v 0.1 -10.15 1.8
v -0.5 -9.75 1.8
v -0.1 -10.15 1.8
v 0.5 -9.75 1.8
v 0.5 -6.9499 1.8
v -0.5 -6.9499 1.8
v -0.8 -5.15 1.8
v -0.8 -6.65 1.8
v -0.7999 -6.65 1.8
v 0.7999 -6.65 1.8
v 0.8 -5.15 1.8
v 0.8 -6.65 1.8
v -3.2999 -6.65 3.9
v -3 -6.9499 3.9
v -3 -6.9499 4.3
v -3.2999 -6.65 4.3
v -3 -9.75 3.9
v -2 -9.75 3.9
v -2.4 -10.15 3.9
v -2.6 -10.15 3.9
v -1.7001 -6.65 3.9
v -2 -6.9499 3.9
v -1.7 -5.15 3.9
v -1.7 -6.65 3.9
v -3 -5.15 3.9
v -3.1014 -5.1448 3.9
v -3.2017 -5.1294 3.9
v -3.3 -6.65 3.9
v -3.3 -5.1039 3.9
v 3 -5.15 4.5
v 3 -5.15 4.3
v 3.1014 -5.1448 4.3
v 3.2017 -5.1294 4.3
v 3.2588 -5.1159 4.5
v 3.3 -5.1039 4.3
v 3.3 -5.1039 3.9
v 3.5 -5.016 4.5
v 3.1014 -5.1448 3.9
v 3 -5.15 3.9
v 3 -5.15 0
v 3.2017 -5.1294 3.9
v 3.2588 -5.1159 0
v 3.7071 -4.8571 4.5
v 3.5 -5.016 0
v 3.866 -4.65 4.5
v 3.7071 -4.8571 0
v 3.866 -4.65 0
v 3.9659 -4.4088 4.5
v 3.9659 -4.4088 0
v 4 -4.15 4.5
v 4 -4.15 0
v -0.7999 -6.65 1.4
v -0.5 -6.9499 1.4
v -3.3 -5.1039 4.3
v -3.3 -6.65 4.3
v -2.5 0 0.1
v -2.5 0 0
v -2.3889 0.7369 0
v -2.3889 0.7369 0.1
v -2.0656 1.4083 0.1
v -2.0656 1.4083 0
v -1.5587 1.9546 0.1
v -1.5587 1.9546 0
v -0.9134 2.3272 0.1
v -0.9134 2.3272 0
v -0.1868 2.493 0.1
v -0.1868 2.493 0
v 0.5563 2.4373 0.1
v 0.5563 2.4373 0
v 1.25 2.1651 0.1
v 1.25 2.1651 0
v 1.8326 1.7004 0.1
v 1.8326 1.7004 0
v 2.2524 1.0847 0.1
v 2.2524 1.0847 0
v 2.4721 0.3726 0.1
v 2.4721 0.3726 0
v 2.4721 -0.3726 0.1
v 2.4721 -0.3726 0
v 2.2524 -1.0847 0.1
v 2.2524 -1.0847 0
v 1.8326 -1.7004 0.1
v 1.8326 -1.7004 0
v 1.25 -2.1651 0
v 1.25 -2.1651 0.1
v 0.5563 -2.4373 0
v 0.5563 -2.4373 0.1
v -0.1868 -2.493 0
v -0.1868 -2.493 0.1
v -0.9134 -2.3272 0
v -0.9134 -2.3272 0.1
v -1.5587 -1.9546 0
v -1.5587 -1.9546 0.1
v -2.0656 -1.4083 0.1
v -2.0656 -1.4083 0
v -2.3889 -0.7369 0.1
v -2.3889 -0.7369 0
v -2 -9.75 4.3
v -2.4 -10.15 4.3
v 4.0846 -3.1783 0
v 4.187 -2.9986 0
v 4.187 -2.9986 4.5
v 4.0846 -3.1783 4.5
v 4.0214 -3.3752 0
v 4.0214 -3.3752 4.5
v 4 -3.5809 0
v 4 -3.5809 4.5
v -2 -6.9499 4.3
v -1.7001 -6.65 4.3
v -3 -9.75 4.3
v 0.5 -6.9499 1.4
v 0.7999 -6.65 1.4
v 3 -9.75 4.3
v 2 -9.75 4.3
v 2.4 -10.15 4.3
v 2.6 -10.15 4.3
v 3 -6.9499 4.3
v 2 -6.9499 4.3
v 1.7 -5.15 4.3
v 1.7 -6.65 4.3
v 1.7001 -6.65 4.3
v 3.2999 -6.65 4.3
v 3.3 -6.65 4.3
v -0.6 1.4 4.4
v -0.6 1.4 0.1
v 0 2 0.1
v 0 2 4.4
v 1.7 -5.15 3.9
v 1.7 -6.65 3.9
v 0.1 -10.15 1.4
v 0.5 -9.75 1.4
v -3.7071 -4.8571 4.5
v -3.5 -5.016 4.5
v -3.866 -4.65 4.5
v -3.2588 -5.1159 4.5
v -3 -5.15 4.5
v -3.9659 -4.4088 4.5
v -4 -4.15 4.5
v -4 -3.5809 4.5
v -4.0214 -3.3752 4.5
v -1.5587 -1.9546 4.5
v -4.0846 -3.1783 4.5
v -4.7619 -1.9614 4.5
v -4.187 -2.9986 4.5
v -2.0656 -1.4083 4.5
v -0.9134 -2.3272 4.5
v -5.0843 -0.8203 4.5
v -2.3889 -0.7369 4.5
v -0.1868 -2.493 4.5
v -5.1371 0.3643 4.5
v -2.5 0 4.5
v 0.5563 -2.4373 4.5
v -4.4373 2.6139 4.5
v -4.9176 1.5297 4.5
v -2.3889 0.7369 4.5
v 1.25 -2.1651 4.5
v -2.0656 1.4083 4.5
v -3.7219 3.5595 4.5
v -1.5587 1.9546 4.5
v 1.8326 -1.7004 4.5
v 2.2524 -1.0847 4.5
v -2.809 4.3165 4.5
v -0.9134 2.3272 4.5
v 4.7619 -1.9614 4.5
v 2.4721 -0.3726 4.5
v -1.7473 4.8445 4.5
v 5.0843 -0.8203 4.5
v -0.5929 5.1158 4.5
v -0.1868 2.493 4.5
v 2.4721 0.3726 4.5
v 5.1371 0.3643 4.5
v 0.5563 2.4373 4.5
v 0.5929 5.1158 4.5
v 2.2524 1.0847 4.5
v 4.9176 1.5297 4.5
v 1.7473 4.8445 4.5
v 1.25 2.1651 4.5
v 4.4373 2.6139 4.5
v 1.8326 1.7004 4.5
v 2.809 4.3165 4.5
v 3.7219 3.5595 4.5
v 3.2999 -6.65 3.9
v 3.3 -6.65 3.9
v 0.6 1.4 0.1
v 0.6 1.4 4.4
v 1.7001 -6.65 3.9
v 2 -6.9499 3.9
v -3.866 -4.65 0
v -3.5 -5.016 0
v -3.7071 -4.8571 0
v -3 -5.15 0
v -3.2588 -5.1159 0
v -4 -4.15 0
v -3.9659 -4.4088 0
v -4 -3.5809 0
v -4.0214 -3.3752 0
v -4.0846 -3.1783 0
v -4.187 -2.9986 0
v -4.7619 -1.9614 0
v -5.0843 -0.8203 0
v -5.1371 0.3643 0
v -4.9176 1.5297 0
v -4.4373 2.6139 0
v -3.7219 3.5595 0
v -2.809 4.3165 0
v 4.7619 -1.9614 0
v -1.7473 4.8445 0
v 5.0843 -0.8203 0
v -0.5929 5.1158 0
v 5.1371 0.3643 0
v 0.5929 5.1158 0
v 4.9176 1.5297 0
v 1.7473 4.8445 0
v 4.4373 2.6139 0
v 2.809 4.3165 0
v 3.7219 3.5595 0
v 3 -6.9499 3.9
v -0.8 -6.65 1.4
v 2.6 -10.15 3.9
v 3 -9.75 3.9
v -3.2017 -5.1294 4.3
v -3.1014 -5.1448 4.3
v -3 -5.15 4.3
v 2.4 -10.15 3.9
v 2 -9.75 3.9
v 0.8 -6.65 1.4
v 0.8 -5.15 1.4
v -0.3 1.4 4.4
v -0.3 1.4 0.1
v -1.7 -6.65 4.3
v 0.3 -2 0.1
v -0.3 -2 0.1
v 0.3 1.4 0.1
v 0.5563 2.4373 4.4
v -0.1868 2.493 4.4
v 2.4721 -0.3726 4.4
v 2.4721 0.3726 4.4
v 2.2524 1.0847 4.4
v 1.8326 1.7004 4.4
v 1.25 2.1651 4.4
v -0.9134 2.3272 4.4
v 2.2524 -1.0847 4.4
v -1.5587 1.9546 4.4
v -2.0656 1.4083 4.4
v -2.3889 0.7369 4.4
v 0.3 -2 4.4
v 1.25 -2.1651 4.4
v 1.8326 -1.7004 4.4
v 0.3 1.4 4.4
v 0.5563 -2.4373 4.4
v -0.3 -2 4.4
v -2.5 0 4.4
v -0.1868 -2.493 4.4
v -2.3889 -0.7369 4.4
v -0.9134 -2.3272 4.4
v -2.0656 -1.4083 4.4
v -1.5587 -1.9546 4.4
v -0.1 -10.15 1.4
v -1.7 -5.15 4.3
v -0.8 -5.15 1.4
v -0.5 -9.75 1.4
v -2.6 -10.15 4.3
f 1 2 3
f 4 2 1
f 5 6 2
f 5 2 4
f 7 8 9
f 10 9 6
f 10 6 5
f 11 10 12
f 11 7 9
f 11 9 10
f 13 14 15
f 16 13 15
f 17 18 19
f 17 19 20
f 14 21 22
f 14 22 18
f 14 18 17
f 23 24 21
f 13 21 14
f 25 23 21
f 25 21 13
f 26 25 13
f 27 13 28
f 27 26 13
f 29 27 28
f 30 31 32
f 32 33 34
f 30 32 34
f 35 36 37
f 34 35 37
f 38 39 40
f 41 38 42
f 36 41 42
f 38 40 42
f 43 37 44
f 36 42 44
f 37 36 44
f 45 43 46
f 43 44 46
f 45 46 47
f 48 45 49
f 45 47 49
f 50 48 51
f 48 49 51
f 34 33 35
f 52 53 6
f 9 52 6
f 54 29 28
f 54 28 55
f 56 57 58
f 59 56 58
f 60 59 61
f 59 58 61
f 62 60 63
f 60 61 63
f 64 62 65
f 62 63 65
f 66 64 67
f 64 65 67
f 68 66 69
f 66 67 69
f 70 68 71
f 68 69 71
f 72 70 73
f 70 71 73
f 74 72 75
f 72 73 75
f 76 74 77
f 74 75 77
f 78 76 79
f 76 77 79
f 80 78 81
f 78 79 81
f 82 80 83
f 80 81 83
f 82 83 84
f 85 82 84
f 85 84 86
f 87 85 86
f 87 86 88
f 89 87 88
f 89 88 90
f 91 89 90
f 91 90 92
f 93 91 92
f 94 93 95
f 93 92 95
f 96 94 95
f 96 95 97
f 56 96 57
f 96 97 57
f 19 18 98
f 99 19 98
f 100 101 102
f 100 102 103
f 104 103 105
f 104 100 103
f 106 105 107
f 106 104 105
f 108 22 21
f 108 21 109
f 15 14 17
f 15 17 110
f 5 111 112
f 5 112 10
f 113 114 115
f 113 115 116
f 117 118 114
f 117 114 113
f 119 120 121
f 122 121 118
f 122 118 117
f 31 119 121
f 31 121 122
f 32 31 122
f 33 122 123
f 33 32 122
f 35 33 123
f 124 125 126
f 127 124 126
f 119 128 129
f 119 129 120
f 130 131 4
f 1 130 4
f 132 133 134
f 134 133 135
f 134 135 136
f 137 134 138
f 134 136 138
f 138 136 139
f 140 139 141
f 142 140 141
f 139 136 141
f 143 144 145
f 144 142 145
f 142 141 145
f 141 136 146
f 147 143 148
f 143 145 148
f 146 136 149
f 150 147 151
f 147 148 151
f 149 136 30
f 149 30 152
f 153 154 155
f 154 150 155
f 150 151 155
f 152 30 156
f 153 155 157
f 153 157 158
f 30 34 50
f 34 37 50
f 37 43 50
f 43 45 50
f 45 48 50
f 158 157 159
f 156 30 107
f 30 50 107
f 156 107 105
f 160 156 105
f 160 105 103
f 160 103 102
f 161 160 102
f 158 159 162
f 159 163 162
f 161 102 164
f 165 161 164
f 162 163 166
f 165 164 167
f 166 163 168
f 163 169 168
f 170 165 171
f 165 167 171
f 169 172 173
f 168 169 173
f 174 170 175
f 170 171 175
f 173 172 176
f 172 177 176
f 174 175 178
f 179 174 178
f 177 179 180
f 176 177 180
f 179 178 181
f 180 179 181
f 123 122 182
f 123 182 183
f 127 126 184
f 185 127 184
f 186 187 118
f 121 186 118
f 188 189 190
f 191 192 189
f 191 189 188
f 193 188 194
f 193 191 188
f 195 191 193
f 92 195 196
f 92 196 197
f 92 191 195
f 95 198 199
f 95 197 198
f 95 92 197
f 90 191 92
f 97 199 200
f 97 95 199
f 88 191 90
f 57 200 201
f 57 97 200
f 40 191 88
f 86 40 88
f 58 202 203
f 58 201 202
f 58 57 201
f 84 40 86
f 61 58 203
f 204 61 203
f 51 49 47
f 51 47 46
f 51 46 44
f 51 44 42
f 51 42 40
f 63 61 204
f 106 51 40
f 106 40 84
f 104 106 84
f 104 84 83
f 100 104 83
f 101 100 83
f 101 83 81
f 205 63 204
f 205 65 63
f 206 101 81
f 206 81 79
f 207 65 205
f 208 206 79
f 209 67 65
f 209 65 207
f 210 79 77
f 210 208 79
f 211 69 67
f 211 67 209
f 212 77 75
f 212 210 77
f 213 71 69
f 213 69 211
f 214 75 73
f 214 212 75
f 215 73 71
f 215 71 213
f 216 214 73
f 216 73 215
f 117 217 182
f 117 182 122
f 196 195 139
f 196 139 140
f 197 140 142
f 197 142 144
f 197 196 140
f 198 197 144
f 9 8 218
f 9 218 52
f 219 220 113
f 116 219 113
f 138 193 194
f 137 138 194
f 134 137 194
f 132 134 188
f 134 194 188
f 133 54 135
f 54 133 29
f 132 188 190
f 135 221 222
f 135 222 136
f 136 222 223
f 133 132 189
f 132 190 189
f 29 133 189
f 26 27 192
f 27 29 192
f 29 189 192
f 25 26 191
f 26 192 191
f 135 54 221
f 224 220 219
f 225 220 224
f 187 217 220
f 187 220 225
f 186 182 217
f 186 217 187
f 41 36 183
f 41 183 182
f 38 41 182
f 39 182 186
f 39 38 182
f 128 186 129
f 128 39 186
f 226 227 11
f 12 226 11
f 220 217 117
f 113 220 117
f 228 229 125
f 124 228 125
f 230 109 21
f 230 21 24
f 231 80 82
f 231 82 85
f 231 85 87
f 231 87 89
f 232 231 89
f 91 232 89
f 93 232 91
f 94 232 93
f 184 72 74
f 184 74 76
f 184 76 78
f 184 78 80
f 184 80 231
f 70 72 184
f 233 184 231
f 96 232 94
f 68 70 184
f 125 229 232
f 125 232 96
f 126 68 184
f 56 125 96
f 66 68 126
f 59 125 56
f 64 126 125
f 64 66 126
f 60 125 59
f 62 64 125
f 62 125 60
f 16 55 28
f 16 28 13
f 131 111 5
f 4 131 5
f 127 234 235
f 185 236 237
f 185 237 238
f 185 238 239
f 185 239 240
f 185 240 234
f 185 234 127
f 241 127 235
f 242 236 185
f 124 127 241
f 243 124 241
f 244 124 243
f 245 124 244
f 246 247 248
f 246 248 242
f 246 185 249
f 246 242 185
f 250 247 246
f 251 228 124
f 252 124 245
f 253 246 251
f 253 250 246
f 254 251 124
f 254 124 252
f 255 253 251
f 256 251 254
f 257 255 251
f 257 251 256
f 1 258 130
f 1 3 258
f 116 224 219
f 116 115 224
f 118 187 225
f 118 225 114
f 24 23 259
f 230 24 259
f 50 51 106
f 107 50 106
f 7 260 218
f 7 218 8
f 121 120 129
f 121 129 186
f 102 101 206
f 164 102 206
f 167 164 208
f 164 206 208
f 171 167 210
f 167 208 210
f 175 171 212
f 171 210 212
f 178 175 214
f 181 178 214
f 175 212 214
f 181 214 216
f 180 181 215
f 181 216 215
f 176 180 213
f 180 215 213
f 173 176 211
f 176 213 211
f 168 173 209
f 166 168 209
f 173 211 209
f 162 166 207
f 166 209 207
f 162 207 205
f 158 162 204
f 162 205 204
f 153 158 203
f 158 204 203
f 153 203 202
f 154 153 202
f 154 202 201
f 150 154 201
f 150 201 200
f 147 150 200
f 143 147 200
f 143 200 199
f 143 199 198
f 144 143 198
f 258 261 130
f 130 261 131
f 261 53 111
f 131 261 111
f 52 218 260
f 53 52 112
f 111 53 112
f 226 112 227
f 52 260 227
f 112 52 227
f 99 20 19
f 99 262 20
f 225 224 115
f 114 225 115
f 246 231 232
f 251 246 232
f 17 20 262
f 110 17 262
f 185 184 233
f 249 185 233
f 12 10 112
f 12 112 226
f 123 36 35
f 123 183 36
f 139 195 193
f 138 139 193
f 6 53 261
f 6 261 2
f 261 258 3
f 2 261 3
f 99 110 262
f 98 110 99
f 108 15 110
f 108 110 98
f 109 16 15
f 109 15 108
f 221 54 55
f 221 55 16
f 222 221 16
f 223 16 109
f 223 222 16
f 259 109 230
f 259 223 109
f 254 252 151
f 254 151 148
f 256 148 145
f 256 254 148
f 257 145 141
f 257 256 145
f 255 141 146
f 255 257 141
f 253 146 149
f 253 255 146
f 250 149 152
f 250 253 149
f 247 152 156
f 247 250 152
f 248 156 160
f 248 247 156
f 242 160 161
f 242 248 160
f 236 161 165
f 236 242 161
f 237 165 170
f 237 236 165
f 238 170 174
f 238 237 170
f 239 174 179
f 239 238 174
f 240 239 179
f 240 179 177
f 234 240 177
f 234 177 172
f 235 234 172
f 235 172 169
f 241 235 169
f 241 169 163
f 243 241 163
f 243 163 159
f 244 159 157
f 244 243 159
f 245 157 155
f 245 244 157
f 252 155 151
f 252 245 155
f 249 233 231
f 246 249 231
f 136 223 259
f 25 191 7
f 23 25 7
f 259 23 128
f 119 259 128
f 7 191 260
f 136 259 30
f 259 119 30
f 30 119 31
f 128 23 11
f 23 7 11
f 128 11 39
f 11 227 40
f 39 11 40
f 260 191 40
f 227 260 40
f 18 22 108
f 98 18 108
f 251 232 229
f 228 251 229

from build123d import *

# Parameters (mm, degrees)
BOSS_EXTRU_1_DEPTH      = 4.5
ESQUISSE2_W             = 1.6
ESQUISSE2_H             = 0.4
BOSS_EXTRU_2_DEPTH      = 1.5
ESQUISSE3_W             = 1
ESQUISSE3_H             = 0.4
BOSS_EXTRU_3_DEPTH      = 3.5
CHANFREIN1_SIZE         = 0.3
CHANFREIN2_SIZE         = 0.4
ESQUISSE4_R             = 2.5
ENL_V_MAT_EXTRU_1_DEPTH = 0.1
ENL_V_START             = -0.1
ESQUISSE5_R             = 2.5
ENL_V_MAT_EXTRU_2_DEPTH = 0.1
ENL_V_MAT_EXTRU_3_DEPTH = 13.202663644
CONG_1_R                = 1


# Some blends are built 0.0001 mm under size
with BuildPart() as part:
    # Esquisse1 → Boss.-Extru.1 (new body)
    with BuildSketch(Plane.XY):
        with BuildLine():
            Line((-4, -3.243840317), (-4, -5.15))
            Line((-4, -5.15), (4, -5.15))
            Line((4, -5.15), (4, -3.243840317))
            ThreePointArc((4, -3.243840317), (0, 5.15), (-4, -3.243840317))
        make_face()
    extrude(amount=BOSS_EXTRU_1_DEPTH)

    # Esquisse2 → Boss.-Extru.2 (add)
    with BuildSketch(Plane.XZ.offset(5.15)):
        with Locations((-2.5, 4.1)):
            Rectangle(ESQUISSE2_W, ESQUISSE2_H)
        with Locations((2.5, 4.1)):
            Rectangle(ESQUISSE2_W, ESQUISSE2_H)
        with Locations((0, 1.6)):
            Rectangle(ESQUISSE2_W, ESQUISSE2_H)
    extrude(amount=BOSS_EXTRU_2_DEPTH)

    # Esquisse3 → Boss.-Extru.3 (add)
    with BuildSketch(Plane.XZ.offset(6.65)):
        with Locations((-2.5, 4.1)):
            Rectangle(ESQUISSE3_W, ESQUISSE3_H)
        with Locations((2.5, 4.1)):
            Rectangle(ESQUISSE3_W, ESQUISSE3_H)
        with Locations((0, 1.6)):
            Rectangle(ESQUISSE3_W, ESQUISSE3_H)
    extrude(amount=BOSS_EXTRU_3_DEPTH)

    # Chanfrein1
    chanfrein1_edges = [part.edges().sort_by_distance(p)[0] for p in [
        (3, -6.65, 4.1),
        (-2, -6.65, 4.1),
        (0.5, -6.65, 1.6),
        (-0.5, -6.65, 1.6),
        (2, -6.65, 4.1),
        (-3, -6.65, 4.1),
    ]]
    chamfer(chanfrein1_edges, length=CHANFREIN1_SIZE - 0.0001)  # a hair under: the kernel refuses the full size

    # Chanfrein2
    chanfrein2_edges = [part.edges().sort_by_distance(p)[0] for p in [
        (-3, -10.15, 4.1),
        (-2, -10.15, 4.1),
        (2, -10.15, 4.1),
        (3, -10.15, 4.1),
        (-0.5, -10.15, 1.6),
        (0.5, -10.15, 1.6),
    ]]
    chamfer(chanfrein2_edges, length=CHANFREIN2_SIZE)

    # Esquisse4 → Enlèv. mat.-Extru.1 (cut)
    with BuildSketch(Plane(origin=(0, 0, 0), x_dir=(-1, 0, 0), z_dir=(0, 0, -1))):
        Circle(ESQUISSE4_R)
    extrude(amount=-ENL_V_MAT_EXTRU_1_DEPTH, mode=Mode.SUBTRACT)

    # Esquisse5 → Enlèv. mat.-Extru.2 (cut)
    with BuildSketch(Plane.XY.offset(4.5).offset(ENL_V_START)):
        with Locations(Location((0, 0, 0), (0, 0, 180))):
            Circle(ESQUISSE5_R)
    extrude(amount=ENL_V_MAT_EXTRU_2_DEPTH, mode=Mode.SUBTRACT)

    # Esquisse6 → Enlèv. mat.-Extru.3 (cut, through all)
    with BuildSketch(Plane(origin=(0, 0, 0.1), x_dir=(-1, 0, 0), z_dir=(0, 0, -1))):
        Polygon((0, 2), (-0.6, 1.4), (-0.3, 1.4), (-0.3, -2), (0.3, -2), (0.3, 1.4), (0.6, 1.4), align=None)
    extrude(amount=-ENL_V_MAT_EXTRU_3_DEPTH, mode=Mode.SUBTRACT)

    # Congé1
    # the kernel refuses this fillet: 1 mm, written as the material it adds along each edge
    with BuildSketch(Plane(origin=(-4, -3.243840317, 0), x_dir=(0, -1, 0), z_dir=(0, 0, 1))) as cong_1_piece_1:
        with BuildLine():
            CenterArc((0.337011537, -1), CONG_1_R, 90, 35.609116242)
            ThreePointArc((-0.245240797, -0.18699187), (-0.12122038, -0.095332066), (0, 0))
            Line((0, 0), (0.337011537, 0))
        make_face()
    extrude(amount=4.5)
    with BuildSketch(Plane(origin=(4, -3.243840317, 0), x_dir=(0, -1, 0), z_dir=(0, 0, 1))) as cong_1_piece_2:
        with BuildLine():
            CenterArc((0.337011537, 1), CONG_1_R, 234.390883758, 35.609116242)
            ThreePointArc((-0.245240797, 0.18699187), (-0.12122038, 0.095332066), (0, 0))
            Line((0, 0), (0.337011537, 0))
        make_face()
    extrude(amount=4.5)
    # the kernel refuses this fillet: 1 mm, written as the material it takes off along each edge
    with BuildSketch(Plane(origin=(-4, -5.15, -2.5), x_dir=(1, 0, 0), z_dir=(0, 0, 1))) as cong_1_2_piece_1_section:
        with BuildLine():
            CenterArc((CONG_1_R, CONG_1_R), CONG_1_R, 180, 90)
            Line((0, CONG_1_R), (0, 0))
            Line((0, 0), (CONG_1_R, 0))
        make_face()
    cong_1_2_piece_1 = extrude(amount=9.5, mode=Mode.PRIVATE)
    cong_1_2_piece_1 = split(cong_1_2_piece_1, bisect_by=Plane(origin=(-3.3, -5.149735602, 0.7), z_dir=(1, 0, 0)), keep=Keep.TOP, mode=Mode.PRIVATE)
    cong_1_2_piece_1 = split(cong_1_2_piece_1, bisect_by=Plane(origin=(-3.182548732, -5.149735602, 3.9), z_dir=(0, 0, -1)), keep=Keep.TOP, mode=Mode.PRIVATE)
    add(cong_1_2_piece_1, mode=Mode.SUBTRACT)
    with BuildSketch(Plane(origin=(-4, -5.15, -2.5), x_dir=(1, 0, 0), z_dir=(0, 0, 1))) as cong_1_2_piece_2_section:
        with BuildLine():
            CenterArc((CONG_1_R, CONG_1_R), CONG_1_R, 180, 90)
            Line((0, CONG_1_R), (0, 0))
            Line((0, 0), (CONG_1_R, 0))
        make_face()
    cong_1_2_piece_2 = extrude(amount=9.5, mode=Mode.PRIVATE)
    cong_1_2_piece_2 = split(cong_1_2_piece_2, bisect_by=Plane(origin=(-3.3, -4.913833239, 0.7), z_dir=(-1, 0, 0)), keep=Keep.TOP, mode=Mode.PRIVATE)
    cong_1_2_piece_2 = split(cong_1_2_piece_2, bisect_by=Plane(origin=(-3.799145829, -4.913833239, 3.9), z_dir=(0, 0, -1)), keep=Keep.TOP, mode=Mode.PRIVATE)
    add(cong_1_2_piece_2, mode=Mode.SUBTRACT)
    with BuildSketch(Plane(origin=(-4, -5.15, -2.5), x_dir=(1, 0, 0), z_dir=(0, 0, 1))) as cong_1_2_piece_3_section:
        with BuildLine():
            CenterArc((CONG_1_R, CONG_1_R), CONG_1_R, 180, 90)
            Line((0, CONG_1_R), (0, 0))
            Line((0, 0), (CONG_1_R, 0))
        make_face()
    cong_1_2_piece_3 = extrude(amount=9.5, mode=Mode.PRIVATE)
    cong_1_2_piece_3 = split(cong_1_2_piece_3, bisect_by=Plane(origin=(-3.799145829, -4.913833239, 4.3), z_dir=(0, 0, -1)), keep=Keep.TOP, mode=Mode.PRIVATE)
    cong_1_2_piece_3 = split(cong_1_2_piece_3, bisect_by=Plane(origin=(-3.3, -4.913833239, 4.1), z_dir=(-1, 0, 0)), keep=Keep.TOP, mode=Mode.PRIVATE)
    cong_1_2_piece_3 = split(cong_1_2_piece_3, bisect_by=Plane(origin=(-3.799145829, -4.913833239, 3.9), z_dir=(0, 0, 1)), keep=Keep.TOP, mode=Mode.PRIVATE)
    add(cong_1_2_piece_3, mode=Mode.SUBTRACT)
    with BuildSketch(Plane(origin=(-4, -5.15, -2.5), x_dir=(1, 0, 0), z_dir=(0, 0, 1))) as cong_1_2_piece_4_section:
        with BuildLine():
            CenterArc((CONG_1_R, CONG_1_R), CONG_1_R, 180, 90)
            Line((0, CONG_1_R), (0, 0))
            Line((0, 0), (CONG_1_R, 0))
        make_face()
    cong_1_2_piece_4 = extrude(amount=9.5, mode=Mode.PRIVATE)
    cong_1_2_piece_4 = split(cong_1_2_piece_4, bisect_by=Plane(origin=(-3.182548732, -5.149735602, 4.3), z_dir=(0, 0, 1)), keep=Keep.TOP, mode=Mode.PRIVATE)
    cong_1_2_piece_4 = split(cong_1_2_piece_4, bisect_by=Plane(origin=(-3.3, -5.149735602, 5.65), z_dir=(1, 0, 0)), keep=Keep.TOP, mode=Mode.PRIVATE)
    add(cong_1_2_piece_4, mode=Mode.SUBTRACT)
    with BuildSketch(Plane(origin=(-4, -5.15, -2.5), x_dir=(1, 0, 0), z_dir=(0, 0, 1))) as cong_1_2_piece_5_section:
        with BuildLine():
            CenterArc((CONG_1_R, CONG_1_R), CONG_1_R, 180, 90)
            Line((0, CONG_1_R), (0, 0))
            Line((0, 0), (CONG_1_R, 0))
        make_face()
    cong_1_2_piece_5 = extrude(amount=9.5, mode=Mode.PRIVATE)
    cong_1_2_piece_5 = split(cong_1_2_piece_5, bisect_by=Plane(origin=(-3.799145829, -4.913833239, 4.3), z_dir=(0, 0, 1)), keep=Keep.TOP, mode=Mode.PRIVATE)
    cong_1_2_piece_5 = split(cong_1_2_piece_5, bisect_by=Plane(origin=(-3.3, -4.913833239, 5.65), z_dir=(-1, 0, 0)), keep=Keep.TOP, mode=Mode.PRIVATE)
    add(cong_1_2_piece_5, mode=Mode.SUBTRACT)
    with BuildSketch(Plane(origin=(4, -5.15, -2.5), x_dir=(-1, 0, 0), z_dir=(0, 0, 1))) as cong_1_2_piece_6_section:
        with BuildLine():
            CenterArc((CONG_1_R, -CONG_1_R), CONG_1_R, 90, 90)
            Line((0, -CONG_1_R), (0, 0))
            Line((0, 0), (CONG_1_R, 0))
        make_face()
    cong_1_2_piece_6 = extrude(amount=9.5, mode=Mode.PRIVATE)
    cong_1_2_piece_6 = split(cong_1_2_piece_6, bisect_by=Plane(origin=(3.3, -5.149735602, 0.7), z_dir=(-1, 0, 0)), keep=Keep.TOP, mode=Mode.PRIVATE)
    cong_1_2_piece_6 = split(cong_1_2_piece_6, bisect_by=Plane(origin=(3.182548732, -5.149735602, 3.9), z_dir=(0, 0, -1)), keep=Keep.TOP, mode=Mode.PRIVATE)
    add(cong_1_2_piece_6, mode=Mode.SUBTRACT)
    with BuildSketch(Plane(origin=(4, -5.15, -2.5), x_dir=(-1, 0, 0), z_dir=(0, 0, 1))) as cong_1_2_piece_7_section:
        with BuildLine():
            CenterArc((CONG_1_R, -CONG_1_R), CONG_1_R, 90, 90)
            Line((0, -CONG_1_R), (0, 0))
            Line((0, 0), (CONG_1_R, 0))
        make_face()
    cong_1_2_piece_7 = extrude(amount=9.5, mode=Mode.PRIVATE)
    cong_1_2_piece_7 = split(cong_1_2_piece_7, bisect_by=Plane(origin=(3.3, -4.913833239, 0.7), z_dir=(1, 0, 0)), keep=Keep.TOP, mode=Mode.PRIVATE)
    cong_1_2_piece_7 = split(cong_1_2_piece_7, bisect_by=Plane(origin=(3.799145829, -4.913833239, 3.9), z_dir=(0, 0, -1)), keep=Keep.TOP, mode=Mode.PRIVATE)
    add(cong_1_2_piece_7, mode=Mode.SUBTRACT)
    with BuildSketch(Plane(origin=(4, -5.15, -2.5), x_dir=(-1, 0, 0), z_dir=(0, 0, 1))) as cong_1_2_piece_8_section:
        with BuildLine():
            CenterArc((CONG_1_R, -CONG_1_R), CONG_1_R, 90, 90)
            Line((0, -CONG_1_R), (0, 0))
            Line((0, 0), (CONG_1_R, 0))
        make_face()
    cong_1_2_piece_8 = extrude(amount=9.5, mode=Mode.PRIVATE)
    cong_1_2_piece_8 = split(cong_1_2_piece_8, bisect_by=Plane(origin=(3.799145829, -4.913833239, 4.3), z_dir=(0, 0, -1)), keep=Keep.TOP, mode=Mode.PRIVATE)
    cong_1_2_piece_8 = split(cong_1_2_piece_8, bisect_by=Plane(origin=(3.3, -4.913833239, 4.1), z_dir=(1, 0, 0)), keep=Keep.TOP, mode=Mode.PRIVATE)
    cong_1_2_piece_8 = split(cong_1_2_piece_8, bisect_by=Plane(origin=(3.799145829, -4.913833239, 3.9), z_dir=(0, 0, 1)), keep=Keep.TOP, mode=Mode.PRIVATE)
    add(cong_1_2_piece_8, mode=Mode.SUBTRACT)
    with BuildSketch(Plane(origin=(4, -5.15, -2.5), x_dir=(-1, 0, 0), z_dir=(0, 0, 1))) as cong_1_2_piece_9_section:
        with BuildLine():
            CenterArc((CONG_1_R, -CONG_1_R), CONG_1_R, 90, 90)
            Line((0, -CONG_1_R), (0, 0))
            Line((0, 0), (CONG_1_R, 0))
        make_face()
    cong_1_2_piece_9 = extrude(amount=9.5, mode=Mode.PRIVATE)
    cong_1_2_piece_9 = split(cong_1_2_piece_9, bisect_by=Plane(origin=(3.182548732, -5.149735602, 4.3), z_dir=(0, 0, 1)), keep=Keep.TOP, mode=Mode.PRIVATE)
    cong_1_2_piece_9 = split(cong_1_2_piece_9, bisect_by=Plane(origin=(3.3, -5.149735602, 5.65), z_dir=(-1, 0, 0)), keep=Keep.TOP, mode=Mode.PRIVATE)
    add(cong_1_2_piece_9, mode=Mode.SUBTRACT)
    with BuildSketch(Plane(origin=(4, -5.15, -2.5), x_dir=(-1, 0, 0), z_dir=(0, 0, 1))) as cong_1_2_piece_10_section:
        with BuildLine():
            CenterArc((CONG_1_R, -CONG_1_R), CONG_1_R, 90, 90)
            Line((0, -CONG_1_R), (0, 0))
            Line((0, 0), (CONG_1_R, 0))
        make_face()
    cong_1_2_piece_10 = extrude(amount=9.5, mode=Mode.PRIVATE)
    cong_1_2_piece_10 = split(cong_1_2_piece_10, bisect_by=Plane(origin=(3.799145829, -4.913833239, 4.3), z_dir=(0, 0, 1)), keep=Keep.TOP, mode=Mode.PRIVATE)
    cong_1_2_piece_10 = split(cong_1_2_piece_10, bisect_by=Plane(origin=(3.3, -4.913833239, 5.65), z_dir=(1, 0, 0)), keep=Keep.TOP, mode=Mode.PRIVATE)
    add(cong_1_2_piece_10, mode=Mode.SUBTRACT)


solid = part.part
